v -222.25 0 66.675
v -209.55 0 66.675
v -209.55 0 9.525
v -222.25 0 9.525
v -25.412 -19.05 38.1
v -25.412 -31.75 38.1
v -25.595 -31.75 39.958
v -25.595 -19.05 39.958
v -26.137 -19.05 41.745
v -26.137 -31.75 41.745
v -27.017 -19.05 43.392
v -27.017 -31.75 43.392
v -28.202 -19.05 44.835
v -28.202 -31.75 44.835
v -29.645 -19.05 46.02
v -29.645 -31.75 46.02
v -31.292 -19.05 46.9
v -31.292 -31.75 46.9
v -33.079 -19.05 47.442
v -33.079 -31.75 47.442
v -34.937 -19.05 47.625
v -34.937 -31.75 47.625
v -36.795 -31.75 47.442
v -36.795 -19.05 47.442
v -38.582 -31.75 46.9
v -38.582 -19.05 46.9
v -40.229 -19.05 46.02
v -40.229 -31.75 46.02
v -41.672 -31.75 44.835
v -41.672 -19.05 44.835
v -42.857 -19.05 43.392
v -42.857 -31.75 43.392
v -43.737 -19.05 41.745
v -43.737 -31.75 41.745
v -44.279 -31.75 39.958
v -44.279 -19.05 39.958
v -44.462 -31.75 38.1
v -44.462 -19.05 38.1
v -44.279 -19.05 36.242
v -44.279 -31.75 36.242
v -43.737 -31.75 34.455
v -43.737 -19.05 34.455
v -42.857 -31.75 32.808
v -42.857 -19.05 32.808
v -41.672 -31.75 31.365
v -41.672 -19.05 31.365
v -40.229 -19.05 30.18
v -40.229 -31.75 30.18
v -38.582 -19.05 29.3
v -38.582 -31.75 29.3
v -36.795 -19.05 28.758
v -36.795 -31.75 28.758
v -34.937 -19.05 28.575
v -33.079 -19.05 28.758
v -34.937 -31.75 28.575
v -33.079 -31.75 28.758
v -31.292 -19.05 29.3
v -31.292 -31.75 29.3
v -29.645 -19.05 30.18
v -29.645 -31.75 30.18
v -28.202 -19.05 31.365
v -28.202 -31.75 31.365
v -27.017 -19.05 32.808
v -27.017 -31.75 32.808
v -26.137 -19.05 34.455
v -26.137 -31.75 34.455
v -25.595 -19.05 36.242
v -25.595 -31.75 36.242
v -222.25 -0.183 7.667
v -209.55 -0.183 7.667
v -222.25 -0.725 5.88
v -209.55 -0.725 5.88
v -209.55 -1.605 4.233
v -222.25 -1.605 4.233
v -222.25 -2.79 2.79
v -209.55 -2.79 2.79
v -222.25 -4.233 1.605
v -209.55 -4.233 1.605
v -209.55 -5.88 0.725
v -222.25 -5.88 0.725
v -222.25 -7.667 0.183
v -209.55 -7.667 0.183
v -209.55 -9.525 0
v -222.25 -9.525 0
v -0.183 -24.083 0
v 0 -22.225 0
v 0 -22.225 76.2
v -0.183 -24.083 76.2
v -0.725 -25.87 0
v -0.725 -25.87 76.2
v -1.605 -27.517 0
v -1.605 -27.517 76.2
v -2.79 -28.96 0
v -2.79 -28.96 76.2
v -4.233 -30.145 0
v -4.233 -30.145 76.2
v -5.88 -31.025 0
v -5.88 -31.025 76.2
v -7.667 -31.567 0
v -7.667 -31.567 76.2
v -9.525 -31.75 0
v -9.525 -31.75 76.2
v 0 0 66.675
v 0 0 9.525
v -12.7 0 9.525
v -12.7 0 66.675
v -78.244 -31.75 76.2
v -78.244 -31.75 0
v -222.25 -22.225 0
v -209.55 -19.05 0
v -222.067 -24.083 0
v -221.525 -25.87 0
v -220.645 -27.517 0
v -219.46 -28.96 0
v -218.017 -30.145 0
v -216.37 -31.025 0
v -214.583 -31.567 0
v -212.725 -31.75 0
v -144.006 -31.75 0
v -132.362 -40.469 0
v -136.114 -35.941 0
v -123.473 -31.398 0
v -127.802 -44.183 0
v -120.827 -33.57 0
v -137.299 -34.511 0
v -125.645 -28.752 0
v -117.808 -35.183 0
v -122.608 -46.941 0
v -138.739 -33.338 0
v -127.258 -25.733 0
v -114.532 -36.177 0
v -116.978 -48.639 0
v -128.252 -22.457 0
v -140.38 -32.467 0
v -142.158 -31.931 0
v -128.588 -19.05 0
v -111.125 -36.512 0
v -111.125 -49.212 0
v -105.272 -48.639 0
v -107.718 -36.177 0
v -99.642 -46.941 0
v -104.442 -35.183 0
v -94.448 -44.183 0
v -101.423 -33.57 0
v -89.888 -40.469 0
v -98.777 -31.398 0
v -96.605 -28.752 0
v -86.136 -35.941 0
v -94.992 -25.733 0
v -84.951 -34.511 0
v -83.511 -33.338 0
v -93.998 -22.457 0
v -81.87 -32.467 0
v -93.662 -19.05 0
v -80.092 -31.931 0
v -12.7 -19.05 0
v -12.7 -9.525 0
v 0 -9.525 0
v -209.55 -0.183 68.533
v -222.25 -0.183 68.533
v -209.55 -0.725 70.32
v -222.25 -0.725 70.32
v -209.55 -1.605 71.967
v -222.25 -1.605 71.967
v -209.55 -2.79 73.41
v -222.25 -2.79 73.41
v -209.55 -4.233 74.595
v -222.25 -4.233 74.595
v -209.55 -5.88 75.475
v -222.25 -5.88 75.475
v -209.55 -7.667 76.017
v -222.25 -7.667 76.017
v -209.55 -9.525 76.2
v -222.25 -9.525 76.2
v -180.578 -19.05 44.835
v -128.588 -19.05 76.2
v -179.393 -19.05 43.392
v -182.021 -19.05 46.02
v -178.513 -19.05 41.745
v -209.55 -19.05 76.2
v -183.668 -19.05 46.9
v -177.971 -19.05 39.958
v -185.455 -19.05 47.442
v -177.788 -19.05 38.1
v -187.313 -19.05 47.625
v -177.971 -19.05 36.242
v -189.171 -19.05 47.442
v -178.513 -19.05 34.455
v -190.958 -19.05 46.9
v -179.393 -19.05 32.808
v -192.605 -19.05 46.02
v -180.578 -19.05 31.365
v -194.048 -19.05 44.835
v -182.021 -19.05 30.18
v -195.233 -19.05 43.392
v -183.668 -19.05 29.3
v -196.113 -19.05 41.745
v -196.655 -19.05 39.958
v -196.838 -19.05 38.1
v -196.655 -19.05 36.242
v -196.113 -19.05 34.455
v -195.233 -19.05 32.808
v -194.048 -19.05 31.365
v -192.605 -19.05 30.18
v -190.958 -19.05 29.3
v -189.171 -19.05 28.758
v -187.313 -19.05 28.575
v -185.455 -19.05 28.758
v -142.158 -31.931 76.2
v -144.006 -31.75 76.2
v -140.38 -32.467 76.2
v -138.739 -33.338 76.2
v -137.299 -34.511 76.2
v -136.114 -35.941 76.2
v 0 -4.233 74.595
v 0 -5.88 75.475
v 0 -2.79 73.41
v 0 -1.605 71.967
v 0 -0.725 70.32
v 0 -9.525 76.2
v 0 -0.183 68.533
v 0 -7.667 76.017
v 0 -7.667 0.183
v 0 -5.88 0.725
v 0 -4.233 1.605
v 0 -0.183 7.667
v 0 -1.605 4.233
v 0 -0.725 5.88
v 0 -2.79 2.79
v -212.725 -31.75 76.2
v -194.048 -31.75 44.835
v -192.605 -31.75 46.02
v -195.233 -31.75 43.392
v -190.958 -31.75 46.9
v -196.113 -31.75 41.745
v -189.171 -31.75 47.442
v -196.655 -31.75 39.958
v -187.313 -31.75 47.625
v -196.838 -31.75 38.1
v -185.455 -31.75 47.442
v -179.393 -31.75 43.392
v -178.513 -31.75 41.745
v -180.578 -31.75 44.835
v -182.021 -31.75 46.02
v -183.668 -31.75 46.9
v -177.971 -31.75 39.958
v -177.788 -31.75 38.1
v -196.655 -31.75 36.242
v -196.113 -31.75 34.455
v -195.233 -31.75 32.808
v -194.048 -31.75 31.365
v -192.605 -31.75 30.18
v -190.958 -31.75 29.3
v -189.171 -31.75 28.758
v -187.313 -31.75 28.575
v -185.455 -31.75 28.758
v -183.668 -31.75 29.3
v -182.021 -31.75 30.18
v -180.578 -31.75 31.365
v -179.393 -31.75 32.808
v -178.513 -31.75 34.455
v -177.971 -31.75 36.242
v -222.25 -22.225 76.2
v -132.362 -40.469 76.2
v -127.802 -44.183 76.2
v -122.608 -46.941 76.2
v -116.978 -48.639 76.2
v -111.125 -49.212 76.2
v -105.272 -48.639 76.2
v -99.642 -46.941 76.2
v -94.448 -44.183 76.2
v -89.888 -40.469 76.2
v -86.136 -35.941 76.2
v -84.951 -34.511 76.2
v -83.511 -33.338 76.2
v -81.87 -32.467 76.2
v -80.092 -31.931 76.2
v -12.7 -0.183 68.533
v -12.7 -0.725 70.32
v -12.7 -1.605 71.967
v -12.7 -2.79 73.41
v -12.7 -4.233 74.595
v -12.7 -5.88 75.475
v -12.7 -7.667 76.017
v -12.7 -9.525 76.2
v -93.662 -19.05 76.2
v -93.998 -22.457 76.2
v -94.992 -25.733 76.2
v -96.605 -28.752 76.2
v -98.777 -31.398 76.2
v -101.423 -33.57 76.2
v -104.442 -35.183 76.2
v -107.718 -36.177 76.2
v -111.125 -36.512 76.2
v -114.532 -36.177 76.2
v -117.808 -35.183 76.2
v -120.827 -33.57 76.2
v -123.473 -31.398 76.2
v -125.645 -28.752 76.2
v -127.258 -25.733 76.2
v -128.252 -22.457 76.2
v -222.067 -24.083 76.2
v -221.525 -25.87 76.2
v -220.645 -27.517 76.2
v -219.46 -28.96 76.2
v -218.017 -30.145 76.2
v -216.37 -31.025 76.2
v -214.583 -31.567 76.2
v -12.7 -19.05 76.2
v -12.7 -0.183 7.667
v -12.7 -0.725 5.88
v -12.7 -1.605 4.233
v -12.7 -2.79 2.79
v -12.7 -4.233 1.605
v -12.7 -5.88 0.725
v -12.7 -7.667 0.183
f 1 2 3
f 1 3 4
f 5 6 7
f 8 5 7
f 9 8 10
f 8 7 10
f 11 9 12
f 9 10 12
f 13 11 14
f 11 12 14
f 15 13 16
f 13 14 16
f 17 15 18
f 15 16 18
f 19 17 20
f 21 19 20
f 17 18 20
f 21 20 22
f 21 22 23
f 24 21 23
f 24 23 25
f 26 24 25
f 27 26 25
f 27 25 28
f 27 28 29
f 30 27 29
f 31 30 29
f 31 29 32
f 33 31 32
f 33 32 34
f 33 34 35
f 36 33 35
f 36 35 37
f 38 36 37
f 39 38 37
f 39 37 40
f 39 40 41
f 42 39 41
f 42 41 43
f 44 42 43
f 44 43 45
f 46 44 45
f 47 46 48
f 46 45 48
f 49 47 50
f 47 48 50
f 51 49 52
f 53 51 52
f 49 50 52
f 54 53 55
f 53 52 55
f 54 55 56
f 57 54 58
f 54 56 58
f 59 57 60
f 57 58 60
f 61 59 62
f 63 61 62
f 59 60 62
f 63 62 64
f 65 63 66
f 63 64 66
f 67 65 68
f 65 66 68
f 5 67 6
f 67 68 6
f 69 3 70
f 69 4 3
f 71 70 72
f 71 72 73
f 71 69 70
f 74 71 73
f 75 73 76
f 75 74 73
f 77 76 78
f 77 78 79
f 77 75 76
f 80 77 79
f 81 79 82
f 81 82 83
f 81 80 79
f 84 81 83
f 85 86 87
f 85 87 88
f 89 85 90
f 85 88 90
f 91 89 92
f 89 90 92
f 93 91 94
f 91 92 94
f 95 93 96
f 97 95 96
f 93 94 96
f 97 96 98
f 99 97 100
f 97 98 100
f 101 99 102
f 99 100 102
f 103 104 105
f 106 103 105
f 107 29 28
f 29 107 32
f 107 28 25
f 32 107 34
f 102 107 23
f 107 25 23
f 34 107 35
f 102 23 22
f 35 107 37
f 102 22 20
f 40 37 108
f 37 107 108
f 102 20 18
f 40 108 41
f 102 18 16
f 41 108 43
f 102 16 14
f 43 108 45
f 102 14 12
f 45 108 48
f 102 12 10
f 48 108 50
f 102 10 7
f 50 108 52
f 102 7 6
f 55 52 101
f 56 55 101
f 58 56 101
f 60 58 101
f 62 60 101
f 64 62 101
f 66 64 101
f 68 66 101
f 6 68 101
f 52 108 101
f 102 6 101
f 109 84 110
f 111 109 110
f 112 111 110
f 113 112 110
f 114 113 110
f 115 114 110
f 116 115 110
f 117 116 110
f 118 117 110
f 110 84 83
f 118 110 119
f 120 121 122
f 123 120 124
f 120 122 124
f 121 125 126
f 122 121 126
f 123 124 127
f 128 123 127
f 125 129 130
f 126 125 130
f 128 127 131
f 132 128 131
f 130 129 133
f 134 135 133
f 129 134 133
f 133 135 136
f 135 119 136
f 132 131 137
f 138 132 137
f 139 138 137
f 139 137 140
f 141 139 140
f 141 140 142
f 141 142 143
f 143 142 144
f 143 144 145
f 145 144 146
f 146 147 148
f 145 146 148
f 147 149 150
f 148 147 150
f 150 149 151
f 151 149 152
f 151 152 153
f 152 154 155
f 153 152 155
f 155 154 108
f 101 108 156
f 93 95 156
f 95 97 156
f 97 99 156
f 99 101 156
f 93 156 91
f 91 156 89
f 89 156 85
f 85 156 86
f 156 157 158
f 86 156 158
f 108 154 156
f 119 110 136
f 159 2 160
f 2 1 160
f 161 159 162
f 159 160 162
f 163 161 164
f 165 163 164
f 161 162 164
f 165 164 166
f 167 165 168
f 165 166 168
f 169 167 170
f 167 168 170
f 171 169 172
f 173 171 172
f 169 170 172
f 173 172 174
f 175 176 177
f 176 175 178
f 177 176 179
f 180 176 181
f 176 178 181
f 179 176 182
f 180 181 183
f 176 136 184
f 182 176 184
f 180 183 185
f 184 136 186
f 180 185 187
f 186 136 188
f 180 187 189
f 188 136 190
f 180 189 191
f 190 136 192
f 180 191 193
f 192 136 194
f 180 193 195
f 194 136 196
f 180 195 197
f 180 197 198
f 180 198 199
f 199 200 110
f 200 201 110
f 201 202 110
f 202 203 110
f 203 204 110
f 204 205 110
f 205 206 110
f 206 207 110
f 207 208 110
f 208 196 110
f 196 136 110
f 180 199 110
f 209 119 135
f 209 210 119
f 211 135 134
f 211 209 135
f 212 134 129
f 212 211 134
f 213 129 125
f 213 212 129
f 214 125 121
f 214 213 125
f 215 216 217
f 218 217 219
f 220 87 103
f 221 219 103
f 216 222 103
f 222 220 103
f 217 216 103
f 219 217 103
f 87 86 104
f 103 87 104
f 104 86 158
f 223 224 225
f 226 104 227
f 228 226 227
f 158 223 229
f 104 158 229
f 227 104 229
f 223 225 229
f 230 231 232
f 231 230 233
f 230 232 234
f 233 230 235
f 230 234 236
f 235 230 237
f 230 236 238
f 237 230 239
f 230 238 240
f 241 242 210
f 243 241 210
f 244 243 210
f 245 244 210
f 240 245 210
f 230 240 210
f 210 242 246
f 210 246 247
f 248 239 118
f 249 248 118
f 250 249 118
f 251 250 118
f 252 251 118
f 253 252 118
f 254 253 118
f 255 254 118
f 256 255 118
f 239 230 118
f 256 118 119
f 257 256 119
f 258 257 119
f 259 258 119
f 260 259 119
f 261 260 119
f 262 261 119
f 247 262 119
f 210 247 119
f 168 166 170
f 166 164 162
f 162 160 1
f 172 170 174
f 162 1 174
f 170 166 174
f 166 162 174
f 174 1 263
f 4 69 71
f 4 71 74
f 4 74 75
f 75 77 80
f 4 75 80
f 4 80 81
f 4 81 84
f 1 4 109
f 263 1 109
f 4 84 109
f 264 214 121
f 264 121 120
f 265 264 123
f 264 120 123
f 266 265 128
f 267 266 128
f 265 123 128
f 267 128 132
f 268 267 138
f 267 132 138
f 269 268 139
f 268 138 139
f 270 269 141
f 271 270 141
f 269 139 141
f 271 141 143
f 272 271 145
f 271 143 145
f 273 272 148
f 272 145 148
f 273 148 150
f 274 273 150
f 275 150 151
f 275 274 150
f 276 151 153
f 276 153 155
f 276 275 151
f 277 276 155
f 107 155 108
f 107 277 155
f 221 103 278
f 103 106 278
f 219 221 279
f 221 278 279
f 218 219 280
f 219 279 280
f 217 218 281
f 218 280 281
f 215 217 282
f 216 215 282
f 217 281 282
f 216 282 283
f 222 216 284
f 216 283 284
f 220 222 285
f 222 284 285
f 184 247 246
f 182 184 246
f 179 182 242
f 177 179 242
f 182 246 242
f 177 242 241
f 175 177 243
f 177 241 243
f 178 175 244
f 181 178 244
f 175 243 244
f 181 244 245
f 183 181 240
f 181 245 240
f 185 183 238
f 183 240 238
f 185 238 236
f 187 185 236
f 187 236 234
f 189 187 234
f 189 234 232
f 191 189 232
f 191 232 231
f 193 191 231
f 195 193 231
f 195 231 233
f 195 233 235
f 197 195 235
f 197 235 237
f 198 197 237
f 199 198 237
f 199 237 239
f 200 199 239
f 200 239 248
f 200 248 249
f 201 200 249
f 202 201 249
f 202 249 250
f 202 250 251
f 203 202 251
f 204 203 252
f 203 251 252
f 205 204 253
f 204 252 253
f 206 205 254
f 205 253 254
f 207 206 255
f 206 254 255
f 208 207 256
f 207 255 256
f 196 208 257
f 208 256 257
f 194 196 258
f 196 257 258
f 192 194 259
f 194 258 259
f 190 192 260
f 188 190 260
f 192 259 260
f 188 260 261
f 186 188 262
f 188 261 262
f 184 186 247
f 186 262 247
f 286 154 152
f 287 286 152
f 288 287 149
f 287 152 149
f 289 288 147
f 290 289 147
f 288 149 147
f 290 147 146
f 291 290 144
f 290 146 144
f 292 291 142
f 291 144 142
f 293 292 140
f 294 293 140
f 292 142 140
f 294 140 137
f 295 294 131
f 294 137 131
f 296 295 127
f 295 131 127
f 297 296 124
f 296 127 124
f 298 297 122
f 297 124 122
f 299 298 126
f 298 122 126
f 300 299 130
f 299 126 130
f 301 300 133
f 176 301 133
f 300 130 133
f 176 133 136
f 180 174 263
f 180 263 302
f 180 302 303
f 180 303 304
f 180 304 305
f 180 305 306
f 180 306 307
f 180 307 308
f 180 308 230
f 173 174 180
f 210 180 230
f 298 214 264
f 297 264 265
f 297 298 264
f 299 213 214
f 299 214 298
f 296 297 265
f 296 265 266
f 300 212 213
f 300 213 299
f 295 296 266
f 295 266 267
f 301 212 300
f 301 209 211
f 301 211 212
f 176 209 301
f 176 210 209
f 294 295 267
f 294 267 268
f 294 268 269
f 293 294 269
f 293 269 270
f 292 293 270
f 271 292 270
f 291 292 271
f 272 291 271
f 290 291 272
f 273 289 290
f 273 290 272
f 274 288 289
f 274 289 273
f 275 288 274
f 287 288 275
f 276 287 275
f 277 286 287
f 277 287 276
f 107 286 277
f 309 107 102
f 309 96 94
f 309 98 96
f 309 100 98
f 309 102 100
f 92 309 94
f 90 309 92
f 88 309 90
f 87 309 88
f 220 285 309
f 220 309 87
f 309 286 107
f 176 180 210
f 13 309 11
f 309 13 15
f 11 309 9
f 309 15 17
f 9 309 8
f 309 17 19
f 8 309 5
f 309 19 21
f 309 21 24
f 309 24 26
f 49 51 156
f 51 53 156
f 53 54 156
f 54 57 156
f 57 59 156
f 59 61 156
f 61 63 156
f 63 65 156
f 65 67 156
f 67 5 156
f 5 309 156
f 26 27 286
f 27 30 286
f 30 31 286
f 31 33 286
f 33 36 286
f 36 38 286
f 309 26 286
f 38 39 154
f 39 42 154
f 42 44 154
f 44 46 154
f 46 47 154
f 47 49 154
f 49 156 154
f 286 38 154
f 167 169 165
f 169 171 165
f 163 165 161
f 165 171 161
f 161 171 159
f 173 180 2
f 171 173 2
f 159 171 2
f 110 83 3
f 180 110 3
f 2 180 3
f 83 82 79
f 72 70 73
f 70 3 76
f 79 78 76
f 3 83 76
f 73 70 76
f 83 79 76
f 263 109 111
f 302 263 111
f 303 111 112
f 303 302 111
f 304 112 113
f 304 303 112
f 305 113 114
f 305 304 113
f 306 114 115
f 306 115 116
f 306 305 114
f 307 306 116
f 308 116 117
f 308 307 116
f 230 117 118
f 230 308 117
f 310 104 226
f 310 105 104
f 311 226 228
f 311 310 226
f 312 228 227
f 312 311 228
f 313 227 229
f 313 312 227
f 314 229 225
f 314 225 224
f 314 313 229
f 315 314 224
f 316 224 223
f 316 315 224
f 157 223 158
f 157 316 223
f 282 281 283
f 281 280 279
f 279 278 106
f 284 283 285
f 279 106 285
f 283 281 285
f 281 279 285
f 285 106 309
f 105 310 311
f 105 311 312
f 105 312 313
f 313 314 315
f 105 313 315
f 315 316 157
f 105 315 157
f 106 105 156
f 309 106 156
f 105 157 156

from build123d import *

# Parameters (mm, degrees)
F1_DEPTH = 76.2
F2_R     = 9.525
F5_DEPTH = 25.4


with BuildPart() as f1:
    # F0 (on Top) → F1 (new body)
    with BuildSketch(Plane.XY):
        with BuildLine():
            Line((0, -31.75), (0, 0))
            Line((0, 0), (-12.7, 0))
            Line((-12.7, 0), (-12.7, -19.05))
            Line((-12.7, -19.05), (-80.9625, -19.05))
            ThreePointArc((-80.9625, -19.05), (-81.671846117, -25.552932615), (-83.7665203959, -31.75))
            Line((-83.7665203959, -31.75), (0, -31.75))
        make_face()
        with BuildLine():
            Line((-222.25, -31.75), (-138.4834796041, -31.75))
            ThreePointArc((-138.4834796041, -31.75), (-140.578153883, -25.552932615), (-141.2875, -19.05))
            Line((-141.2875, -19.05), (-209.55, -19.05))
            Line((-209.55, -19.05), (-209.55, 0))
            Line((-209.55, 0), (-222.25, 0))
            Line((-222.25, 0), (-222.25, -31.75))
        make_face()
        with BuildLine():
            ThreePointArc((-138.4834796041, -31.75), (-111.125, -49.2125), (-83.7665203959, -31.75))
            Line((-83.7665203959, -31.75), (-99.139637834, -31.75))
            ThreePointArc((-99.139637834, -31.75), (-111.125, -36.5125), (-123.110362166, -31.75))
            Line((-123.110362166, -31.75), (-138.4834796041, -31.75))
        make_face()
        with BuildLine():
            ThreePointArc((-141.2875, -19.05), (-140.578153883, -25.552932615), (-138.4834796041, -31.75))
            Line((-138.4834796041, -31.75), (-123.110362166, -31.75))
            ThreePointArc((-123.110362166, -31.75), (-127.1598572347, -25.9653640333), (-128.5875, -19.05))
            Line((-128.5875, -19.05), (-141.2875, -19.05))
        make_face()
        with BuildLine():
            Line((-99.139637834, -31.75), (-83.7665203959, -31.75))
            ThreePointArc((-83.7665203959, -31.75), (-81.671846117, -25.552932615), (-80.9625, -19.05))
            Line((-80.9625, -19.05), (-93.6625, -19.05))
            ThreePointArc((-93.6625, -19.05), (-95.0901427653, -25.9653640333), (-99.139637834, -31.75))
        make_face()
    extrude(amount=F1_DEPTH)

    # F2
    f2_edges = [f1.edges().sort_by_distance(p)[0] for p in [
        (-6.35, 0, 0),
        (-6.35, 0, 76.2),
        (-215.9, 0, 76.2),
        (-215.9, 0, 0),
        (0, -31.75, 38.1),
        (-222.25, -31.75, 38.1),
        (-83.76652, -31.75, 38.1),
        (-138.48348, -31.75, 38.1),
    ]]
    fillet(f2_edges, radius=F2_R)

    # F4 (on face) + F3 (on face) → F5 (cut)
    with BuildSketch(Plane.XZ.offset(31.75)):
        with BuildLine():
            ThreePointArc((-25.4121996562, 38.1), (-28.2020075654, 44.8351920908), (-34.9371996562, 47.625))
            Line((-34.9371996562, 47.625), (-34.9371996562, 38.1))
            Line((-34.9371996562, 38.1), (-34.9371996562, 28.575))
            ThreePointArc((-34.9371996562, 28.575), (-28.2020075654, 31.3648079092), (-25.4121996562, 38.1))
        make_face()
        with BuildLine():
            Line((-34.9371996562, 38.1), (-34.9371996562, 47.625))
            ThreePointArc((-34.9371996562, 47.625), (-44.4621996562, 38.1), (-34.9371996562, 28.575))
            Line((-34.9371996562, 28.575), (-34.9371996562, 38.1))
        make_face()
    with BuildSketch(Plane.XZ.offset(31.75)):
        with BuildLine():
            ThreePointArc((-177.7878003438, 38.1), (-180.577608253, 44.8351920908), (-187.3128003438, 47.625))
            Line((-187.3128003438, 47.625), (-187.3128003438, 38.1))
            Line((-187.3128003438, 38.1), (-187.3128003438, 28.575))
            ThreePointArc((-187.3128003438, 28.575), (-180.577608253, 31.3648079092), (-177.7878003438, 38.1))
        make_face()
        with BuildLine():
            Line((-187.3128003438, 38.1), (-187.3128003438, 47.625))
            ThreePointArc((-187.3128003438, 47.625), (-196.8378003438, 38.1), (-187.3128003438, 28.575))
            Line((-187.3128003438, 28.575), (-187.3128003438, 38.1))
        make_face()
    extrude(amount=-F5_DEPTH, mode=Mode.SUBTRACT)


solid = f1.part
